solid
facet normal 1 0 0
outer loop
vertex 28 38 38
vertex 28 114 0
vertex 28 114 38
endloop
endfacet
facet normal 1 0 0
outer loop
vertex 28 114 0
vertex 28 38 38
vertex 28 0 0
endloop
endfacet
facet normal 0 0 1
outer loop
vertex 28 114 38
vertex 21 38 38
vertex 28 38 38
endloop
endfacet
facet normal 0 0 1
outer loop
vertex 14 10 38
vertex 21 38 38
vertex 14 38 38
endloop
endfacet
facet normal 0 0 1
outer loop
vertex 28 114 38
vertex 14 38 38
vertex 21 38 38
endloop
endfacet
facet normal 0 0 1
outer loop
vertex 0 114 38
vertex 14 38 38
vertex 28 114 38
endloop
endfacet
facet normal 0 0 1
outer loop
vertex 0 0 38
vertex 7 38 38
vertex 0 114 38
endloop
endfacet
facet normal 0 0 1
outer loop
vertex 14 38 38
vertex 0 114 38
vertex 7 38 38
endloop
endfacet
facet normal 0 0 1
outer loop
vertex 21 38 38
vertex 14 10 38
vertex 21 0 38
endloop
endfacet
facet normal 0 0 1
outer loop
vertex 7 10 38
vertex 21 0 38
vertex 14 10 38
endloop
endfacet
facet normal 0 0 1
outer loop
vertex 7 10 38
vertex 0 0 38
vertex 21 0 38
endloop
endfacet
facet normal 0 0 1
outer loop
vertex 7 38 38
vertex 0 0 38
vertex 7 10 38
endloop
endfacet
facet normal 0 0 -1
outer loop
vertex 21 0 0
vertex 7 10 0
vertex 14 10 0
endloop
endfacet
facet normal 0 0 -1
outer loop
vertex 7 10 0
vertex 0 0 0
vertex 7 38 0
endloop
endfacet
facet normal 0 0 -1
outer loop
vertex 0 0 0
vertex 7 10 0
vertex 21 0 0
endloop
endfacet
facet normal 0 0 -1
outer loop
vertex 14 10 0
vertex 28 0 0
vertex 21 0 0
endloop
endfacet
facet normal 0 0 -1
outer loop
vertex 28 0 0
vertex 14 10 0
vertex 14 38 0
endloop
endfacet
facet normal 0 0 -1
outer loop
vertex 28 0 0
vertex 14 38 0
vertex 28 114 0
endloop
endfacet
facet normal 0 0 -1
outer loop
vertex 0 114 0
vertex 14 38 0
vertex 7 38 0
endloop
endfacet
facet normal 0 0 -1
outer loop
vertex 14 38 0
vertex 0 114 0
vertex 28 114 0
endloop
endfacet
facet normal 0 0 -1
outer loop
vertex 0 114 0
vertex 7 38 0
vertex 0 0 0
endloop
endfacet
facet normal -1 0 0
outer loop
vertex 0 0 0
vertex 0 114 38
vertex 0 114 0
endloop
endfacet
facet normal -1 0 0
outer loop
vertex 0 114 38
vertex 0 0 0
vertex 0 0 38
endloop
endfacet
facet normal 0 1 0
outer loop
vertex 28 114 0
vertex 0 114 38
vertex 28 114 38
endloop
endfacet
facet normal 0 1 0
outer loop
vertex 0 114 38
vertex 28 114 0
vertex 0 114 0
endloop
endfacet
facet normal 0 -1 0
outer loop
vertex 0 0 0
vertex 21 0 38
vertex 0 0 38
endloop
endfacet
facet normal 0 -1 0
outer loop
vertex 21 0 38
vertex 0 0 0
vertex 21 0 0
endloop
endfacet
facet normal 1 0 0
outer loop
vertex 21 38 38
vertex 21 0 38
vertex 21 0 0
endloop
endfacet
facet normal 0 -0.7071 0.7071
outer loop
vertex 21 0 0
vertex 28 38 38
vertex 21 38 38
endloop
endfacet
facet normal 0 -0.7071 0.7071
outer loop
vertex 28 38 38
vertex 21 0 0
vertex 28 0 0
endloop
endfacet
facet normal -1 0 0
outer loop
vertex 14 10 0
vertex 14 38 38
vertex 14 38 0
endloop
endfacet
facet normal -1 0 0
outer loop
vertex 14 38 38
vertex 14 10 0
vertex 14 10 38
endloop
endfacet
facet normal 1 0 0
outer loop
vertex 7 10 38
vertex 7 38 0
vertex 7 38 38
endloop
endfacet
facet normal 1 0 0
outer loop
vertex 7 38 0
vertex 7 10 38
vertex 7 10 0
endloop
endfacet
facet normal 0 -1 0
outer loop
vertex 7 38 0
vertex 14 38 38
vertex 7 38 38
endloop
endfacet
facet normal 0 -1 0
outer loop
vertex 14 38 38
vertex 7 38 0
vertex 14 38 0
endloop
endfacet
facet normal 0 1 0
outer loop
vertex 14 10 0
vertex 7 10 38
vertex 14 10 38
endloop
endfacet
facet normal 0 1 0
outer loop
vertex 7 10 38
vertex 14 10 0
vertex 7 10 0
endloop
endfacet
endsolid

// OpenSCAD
difference(){
     difference(){
 cube([28,114,38]);
     rotate([45,0,0])
   translate([21,0,0])
            cube([7,54,30]);
        }
  translate([7,10,0])
        cube([7,28,38]);
    }
    
   
